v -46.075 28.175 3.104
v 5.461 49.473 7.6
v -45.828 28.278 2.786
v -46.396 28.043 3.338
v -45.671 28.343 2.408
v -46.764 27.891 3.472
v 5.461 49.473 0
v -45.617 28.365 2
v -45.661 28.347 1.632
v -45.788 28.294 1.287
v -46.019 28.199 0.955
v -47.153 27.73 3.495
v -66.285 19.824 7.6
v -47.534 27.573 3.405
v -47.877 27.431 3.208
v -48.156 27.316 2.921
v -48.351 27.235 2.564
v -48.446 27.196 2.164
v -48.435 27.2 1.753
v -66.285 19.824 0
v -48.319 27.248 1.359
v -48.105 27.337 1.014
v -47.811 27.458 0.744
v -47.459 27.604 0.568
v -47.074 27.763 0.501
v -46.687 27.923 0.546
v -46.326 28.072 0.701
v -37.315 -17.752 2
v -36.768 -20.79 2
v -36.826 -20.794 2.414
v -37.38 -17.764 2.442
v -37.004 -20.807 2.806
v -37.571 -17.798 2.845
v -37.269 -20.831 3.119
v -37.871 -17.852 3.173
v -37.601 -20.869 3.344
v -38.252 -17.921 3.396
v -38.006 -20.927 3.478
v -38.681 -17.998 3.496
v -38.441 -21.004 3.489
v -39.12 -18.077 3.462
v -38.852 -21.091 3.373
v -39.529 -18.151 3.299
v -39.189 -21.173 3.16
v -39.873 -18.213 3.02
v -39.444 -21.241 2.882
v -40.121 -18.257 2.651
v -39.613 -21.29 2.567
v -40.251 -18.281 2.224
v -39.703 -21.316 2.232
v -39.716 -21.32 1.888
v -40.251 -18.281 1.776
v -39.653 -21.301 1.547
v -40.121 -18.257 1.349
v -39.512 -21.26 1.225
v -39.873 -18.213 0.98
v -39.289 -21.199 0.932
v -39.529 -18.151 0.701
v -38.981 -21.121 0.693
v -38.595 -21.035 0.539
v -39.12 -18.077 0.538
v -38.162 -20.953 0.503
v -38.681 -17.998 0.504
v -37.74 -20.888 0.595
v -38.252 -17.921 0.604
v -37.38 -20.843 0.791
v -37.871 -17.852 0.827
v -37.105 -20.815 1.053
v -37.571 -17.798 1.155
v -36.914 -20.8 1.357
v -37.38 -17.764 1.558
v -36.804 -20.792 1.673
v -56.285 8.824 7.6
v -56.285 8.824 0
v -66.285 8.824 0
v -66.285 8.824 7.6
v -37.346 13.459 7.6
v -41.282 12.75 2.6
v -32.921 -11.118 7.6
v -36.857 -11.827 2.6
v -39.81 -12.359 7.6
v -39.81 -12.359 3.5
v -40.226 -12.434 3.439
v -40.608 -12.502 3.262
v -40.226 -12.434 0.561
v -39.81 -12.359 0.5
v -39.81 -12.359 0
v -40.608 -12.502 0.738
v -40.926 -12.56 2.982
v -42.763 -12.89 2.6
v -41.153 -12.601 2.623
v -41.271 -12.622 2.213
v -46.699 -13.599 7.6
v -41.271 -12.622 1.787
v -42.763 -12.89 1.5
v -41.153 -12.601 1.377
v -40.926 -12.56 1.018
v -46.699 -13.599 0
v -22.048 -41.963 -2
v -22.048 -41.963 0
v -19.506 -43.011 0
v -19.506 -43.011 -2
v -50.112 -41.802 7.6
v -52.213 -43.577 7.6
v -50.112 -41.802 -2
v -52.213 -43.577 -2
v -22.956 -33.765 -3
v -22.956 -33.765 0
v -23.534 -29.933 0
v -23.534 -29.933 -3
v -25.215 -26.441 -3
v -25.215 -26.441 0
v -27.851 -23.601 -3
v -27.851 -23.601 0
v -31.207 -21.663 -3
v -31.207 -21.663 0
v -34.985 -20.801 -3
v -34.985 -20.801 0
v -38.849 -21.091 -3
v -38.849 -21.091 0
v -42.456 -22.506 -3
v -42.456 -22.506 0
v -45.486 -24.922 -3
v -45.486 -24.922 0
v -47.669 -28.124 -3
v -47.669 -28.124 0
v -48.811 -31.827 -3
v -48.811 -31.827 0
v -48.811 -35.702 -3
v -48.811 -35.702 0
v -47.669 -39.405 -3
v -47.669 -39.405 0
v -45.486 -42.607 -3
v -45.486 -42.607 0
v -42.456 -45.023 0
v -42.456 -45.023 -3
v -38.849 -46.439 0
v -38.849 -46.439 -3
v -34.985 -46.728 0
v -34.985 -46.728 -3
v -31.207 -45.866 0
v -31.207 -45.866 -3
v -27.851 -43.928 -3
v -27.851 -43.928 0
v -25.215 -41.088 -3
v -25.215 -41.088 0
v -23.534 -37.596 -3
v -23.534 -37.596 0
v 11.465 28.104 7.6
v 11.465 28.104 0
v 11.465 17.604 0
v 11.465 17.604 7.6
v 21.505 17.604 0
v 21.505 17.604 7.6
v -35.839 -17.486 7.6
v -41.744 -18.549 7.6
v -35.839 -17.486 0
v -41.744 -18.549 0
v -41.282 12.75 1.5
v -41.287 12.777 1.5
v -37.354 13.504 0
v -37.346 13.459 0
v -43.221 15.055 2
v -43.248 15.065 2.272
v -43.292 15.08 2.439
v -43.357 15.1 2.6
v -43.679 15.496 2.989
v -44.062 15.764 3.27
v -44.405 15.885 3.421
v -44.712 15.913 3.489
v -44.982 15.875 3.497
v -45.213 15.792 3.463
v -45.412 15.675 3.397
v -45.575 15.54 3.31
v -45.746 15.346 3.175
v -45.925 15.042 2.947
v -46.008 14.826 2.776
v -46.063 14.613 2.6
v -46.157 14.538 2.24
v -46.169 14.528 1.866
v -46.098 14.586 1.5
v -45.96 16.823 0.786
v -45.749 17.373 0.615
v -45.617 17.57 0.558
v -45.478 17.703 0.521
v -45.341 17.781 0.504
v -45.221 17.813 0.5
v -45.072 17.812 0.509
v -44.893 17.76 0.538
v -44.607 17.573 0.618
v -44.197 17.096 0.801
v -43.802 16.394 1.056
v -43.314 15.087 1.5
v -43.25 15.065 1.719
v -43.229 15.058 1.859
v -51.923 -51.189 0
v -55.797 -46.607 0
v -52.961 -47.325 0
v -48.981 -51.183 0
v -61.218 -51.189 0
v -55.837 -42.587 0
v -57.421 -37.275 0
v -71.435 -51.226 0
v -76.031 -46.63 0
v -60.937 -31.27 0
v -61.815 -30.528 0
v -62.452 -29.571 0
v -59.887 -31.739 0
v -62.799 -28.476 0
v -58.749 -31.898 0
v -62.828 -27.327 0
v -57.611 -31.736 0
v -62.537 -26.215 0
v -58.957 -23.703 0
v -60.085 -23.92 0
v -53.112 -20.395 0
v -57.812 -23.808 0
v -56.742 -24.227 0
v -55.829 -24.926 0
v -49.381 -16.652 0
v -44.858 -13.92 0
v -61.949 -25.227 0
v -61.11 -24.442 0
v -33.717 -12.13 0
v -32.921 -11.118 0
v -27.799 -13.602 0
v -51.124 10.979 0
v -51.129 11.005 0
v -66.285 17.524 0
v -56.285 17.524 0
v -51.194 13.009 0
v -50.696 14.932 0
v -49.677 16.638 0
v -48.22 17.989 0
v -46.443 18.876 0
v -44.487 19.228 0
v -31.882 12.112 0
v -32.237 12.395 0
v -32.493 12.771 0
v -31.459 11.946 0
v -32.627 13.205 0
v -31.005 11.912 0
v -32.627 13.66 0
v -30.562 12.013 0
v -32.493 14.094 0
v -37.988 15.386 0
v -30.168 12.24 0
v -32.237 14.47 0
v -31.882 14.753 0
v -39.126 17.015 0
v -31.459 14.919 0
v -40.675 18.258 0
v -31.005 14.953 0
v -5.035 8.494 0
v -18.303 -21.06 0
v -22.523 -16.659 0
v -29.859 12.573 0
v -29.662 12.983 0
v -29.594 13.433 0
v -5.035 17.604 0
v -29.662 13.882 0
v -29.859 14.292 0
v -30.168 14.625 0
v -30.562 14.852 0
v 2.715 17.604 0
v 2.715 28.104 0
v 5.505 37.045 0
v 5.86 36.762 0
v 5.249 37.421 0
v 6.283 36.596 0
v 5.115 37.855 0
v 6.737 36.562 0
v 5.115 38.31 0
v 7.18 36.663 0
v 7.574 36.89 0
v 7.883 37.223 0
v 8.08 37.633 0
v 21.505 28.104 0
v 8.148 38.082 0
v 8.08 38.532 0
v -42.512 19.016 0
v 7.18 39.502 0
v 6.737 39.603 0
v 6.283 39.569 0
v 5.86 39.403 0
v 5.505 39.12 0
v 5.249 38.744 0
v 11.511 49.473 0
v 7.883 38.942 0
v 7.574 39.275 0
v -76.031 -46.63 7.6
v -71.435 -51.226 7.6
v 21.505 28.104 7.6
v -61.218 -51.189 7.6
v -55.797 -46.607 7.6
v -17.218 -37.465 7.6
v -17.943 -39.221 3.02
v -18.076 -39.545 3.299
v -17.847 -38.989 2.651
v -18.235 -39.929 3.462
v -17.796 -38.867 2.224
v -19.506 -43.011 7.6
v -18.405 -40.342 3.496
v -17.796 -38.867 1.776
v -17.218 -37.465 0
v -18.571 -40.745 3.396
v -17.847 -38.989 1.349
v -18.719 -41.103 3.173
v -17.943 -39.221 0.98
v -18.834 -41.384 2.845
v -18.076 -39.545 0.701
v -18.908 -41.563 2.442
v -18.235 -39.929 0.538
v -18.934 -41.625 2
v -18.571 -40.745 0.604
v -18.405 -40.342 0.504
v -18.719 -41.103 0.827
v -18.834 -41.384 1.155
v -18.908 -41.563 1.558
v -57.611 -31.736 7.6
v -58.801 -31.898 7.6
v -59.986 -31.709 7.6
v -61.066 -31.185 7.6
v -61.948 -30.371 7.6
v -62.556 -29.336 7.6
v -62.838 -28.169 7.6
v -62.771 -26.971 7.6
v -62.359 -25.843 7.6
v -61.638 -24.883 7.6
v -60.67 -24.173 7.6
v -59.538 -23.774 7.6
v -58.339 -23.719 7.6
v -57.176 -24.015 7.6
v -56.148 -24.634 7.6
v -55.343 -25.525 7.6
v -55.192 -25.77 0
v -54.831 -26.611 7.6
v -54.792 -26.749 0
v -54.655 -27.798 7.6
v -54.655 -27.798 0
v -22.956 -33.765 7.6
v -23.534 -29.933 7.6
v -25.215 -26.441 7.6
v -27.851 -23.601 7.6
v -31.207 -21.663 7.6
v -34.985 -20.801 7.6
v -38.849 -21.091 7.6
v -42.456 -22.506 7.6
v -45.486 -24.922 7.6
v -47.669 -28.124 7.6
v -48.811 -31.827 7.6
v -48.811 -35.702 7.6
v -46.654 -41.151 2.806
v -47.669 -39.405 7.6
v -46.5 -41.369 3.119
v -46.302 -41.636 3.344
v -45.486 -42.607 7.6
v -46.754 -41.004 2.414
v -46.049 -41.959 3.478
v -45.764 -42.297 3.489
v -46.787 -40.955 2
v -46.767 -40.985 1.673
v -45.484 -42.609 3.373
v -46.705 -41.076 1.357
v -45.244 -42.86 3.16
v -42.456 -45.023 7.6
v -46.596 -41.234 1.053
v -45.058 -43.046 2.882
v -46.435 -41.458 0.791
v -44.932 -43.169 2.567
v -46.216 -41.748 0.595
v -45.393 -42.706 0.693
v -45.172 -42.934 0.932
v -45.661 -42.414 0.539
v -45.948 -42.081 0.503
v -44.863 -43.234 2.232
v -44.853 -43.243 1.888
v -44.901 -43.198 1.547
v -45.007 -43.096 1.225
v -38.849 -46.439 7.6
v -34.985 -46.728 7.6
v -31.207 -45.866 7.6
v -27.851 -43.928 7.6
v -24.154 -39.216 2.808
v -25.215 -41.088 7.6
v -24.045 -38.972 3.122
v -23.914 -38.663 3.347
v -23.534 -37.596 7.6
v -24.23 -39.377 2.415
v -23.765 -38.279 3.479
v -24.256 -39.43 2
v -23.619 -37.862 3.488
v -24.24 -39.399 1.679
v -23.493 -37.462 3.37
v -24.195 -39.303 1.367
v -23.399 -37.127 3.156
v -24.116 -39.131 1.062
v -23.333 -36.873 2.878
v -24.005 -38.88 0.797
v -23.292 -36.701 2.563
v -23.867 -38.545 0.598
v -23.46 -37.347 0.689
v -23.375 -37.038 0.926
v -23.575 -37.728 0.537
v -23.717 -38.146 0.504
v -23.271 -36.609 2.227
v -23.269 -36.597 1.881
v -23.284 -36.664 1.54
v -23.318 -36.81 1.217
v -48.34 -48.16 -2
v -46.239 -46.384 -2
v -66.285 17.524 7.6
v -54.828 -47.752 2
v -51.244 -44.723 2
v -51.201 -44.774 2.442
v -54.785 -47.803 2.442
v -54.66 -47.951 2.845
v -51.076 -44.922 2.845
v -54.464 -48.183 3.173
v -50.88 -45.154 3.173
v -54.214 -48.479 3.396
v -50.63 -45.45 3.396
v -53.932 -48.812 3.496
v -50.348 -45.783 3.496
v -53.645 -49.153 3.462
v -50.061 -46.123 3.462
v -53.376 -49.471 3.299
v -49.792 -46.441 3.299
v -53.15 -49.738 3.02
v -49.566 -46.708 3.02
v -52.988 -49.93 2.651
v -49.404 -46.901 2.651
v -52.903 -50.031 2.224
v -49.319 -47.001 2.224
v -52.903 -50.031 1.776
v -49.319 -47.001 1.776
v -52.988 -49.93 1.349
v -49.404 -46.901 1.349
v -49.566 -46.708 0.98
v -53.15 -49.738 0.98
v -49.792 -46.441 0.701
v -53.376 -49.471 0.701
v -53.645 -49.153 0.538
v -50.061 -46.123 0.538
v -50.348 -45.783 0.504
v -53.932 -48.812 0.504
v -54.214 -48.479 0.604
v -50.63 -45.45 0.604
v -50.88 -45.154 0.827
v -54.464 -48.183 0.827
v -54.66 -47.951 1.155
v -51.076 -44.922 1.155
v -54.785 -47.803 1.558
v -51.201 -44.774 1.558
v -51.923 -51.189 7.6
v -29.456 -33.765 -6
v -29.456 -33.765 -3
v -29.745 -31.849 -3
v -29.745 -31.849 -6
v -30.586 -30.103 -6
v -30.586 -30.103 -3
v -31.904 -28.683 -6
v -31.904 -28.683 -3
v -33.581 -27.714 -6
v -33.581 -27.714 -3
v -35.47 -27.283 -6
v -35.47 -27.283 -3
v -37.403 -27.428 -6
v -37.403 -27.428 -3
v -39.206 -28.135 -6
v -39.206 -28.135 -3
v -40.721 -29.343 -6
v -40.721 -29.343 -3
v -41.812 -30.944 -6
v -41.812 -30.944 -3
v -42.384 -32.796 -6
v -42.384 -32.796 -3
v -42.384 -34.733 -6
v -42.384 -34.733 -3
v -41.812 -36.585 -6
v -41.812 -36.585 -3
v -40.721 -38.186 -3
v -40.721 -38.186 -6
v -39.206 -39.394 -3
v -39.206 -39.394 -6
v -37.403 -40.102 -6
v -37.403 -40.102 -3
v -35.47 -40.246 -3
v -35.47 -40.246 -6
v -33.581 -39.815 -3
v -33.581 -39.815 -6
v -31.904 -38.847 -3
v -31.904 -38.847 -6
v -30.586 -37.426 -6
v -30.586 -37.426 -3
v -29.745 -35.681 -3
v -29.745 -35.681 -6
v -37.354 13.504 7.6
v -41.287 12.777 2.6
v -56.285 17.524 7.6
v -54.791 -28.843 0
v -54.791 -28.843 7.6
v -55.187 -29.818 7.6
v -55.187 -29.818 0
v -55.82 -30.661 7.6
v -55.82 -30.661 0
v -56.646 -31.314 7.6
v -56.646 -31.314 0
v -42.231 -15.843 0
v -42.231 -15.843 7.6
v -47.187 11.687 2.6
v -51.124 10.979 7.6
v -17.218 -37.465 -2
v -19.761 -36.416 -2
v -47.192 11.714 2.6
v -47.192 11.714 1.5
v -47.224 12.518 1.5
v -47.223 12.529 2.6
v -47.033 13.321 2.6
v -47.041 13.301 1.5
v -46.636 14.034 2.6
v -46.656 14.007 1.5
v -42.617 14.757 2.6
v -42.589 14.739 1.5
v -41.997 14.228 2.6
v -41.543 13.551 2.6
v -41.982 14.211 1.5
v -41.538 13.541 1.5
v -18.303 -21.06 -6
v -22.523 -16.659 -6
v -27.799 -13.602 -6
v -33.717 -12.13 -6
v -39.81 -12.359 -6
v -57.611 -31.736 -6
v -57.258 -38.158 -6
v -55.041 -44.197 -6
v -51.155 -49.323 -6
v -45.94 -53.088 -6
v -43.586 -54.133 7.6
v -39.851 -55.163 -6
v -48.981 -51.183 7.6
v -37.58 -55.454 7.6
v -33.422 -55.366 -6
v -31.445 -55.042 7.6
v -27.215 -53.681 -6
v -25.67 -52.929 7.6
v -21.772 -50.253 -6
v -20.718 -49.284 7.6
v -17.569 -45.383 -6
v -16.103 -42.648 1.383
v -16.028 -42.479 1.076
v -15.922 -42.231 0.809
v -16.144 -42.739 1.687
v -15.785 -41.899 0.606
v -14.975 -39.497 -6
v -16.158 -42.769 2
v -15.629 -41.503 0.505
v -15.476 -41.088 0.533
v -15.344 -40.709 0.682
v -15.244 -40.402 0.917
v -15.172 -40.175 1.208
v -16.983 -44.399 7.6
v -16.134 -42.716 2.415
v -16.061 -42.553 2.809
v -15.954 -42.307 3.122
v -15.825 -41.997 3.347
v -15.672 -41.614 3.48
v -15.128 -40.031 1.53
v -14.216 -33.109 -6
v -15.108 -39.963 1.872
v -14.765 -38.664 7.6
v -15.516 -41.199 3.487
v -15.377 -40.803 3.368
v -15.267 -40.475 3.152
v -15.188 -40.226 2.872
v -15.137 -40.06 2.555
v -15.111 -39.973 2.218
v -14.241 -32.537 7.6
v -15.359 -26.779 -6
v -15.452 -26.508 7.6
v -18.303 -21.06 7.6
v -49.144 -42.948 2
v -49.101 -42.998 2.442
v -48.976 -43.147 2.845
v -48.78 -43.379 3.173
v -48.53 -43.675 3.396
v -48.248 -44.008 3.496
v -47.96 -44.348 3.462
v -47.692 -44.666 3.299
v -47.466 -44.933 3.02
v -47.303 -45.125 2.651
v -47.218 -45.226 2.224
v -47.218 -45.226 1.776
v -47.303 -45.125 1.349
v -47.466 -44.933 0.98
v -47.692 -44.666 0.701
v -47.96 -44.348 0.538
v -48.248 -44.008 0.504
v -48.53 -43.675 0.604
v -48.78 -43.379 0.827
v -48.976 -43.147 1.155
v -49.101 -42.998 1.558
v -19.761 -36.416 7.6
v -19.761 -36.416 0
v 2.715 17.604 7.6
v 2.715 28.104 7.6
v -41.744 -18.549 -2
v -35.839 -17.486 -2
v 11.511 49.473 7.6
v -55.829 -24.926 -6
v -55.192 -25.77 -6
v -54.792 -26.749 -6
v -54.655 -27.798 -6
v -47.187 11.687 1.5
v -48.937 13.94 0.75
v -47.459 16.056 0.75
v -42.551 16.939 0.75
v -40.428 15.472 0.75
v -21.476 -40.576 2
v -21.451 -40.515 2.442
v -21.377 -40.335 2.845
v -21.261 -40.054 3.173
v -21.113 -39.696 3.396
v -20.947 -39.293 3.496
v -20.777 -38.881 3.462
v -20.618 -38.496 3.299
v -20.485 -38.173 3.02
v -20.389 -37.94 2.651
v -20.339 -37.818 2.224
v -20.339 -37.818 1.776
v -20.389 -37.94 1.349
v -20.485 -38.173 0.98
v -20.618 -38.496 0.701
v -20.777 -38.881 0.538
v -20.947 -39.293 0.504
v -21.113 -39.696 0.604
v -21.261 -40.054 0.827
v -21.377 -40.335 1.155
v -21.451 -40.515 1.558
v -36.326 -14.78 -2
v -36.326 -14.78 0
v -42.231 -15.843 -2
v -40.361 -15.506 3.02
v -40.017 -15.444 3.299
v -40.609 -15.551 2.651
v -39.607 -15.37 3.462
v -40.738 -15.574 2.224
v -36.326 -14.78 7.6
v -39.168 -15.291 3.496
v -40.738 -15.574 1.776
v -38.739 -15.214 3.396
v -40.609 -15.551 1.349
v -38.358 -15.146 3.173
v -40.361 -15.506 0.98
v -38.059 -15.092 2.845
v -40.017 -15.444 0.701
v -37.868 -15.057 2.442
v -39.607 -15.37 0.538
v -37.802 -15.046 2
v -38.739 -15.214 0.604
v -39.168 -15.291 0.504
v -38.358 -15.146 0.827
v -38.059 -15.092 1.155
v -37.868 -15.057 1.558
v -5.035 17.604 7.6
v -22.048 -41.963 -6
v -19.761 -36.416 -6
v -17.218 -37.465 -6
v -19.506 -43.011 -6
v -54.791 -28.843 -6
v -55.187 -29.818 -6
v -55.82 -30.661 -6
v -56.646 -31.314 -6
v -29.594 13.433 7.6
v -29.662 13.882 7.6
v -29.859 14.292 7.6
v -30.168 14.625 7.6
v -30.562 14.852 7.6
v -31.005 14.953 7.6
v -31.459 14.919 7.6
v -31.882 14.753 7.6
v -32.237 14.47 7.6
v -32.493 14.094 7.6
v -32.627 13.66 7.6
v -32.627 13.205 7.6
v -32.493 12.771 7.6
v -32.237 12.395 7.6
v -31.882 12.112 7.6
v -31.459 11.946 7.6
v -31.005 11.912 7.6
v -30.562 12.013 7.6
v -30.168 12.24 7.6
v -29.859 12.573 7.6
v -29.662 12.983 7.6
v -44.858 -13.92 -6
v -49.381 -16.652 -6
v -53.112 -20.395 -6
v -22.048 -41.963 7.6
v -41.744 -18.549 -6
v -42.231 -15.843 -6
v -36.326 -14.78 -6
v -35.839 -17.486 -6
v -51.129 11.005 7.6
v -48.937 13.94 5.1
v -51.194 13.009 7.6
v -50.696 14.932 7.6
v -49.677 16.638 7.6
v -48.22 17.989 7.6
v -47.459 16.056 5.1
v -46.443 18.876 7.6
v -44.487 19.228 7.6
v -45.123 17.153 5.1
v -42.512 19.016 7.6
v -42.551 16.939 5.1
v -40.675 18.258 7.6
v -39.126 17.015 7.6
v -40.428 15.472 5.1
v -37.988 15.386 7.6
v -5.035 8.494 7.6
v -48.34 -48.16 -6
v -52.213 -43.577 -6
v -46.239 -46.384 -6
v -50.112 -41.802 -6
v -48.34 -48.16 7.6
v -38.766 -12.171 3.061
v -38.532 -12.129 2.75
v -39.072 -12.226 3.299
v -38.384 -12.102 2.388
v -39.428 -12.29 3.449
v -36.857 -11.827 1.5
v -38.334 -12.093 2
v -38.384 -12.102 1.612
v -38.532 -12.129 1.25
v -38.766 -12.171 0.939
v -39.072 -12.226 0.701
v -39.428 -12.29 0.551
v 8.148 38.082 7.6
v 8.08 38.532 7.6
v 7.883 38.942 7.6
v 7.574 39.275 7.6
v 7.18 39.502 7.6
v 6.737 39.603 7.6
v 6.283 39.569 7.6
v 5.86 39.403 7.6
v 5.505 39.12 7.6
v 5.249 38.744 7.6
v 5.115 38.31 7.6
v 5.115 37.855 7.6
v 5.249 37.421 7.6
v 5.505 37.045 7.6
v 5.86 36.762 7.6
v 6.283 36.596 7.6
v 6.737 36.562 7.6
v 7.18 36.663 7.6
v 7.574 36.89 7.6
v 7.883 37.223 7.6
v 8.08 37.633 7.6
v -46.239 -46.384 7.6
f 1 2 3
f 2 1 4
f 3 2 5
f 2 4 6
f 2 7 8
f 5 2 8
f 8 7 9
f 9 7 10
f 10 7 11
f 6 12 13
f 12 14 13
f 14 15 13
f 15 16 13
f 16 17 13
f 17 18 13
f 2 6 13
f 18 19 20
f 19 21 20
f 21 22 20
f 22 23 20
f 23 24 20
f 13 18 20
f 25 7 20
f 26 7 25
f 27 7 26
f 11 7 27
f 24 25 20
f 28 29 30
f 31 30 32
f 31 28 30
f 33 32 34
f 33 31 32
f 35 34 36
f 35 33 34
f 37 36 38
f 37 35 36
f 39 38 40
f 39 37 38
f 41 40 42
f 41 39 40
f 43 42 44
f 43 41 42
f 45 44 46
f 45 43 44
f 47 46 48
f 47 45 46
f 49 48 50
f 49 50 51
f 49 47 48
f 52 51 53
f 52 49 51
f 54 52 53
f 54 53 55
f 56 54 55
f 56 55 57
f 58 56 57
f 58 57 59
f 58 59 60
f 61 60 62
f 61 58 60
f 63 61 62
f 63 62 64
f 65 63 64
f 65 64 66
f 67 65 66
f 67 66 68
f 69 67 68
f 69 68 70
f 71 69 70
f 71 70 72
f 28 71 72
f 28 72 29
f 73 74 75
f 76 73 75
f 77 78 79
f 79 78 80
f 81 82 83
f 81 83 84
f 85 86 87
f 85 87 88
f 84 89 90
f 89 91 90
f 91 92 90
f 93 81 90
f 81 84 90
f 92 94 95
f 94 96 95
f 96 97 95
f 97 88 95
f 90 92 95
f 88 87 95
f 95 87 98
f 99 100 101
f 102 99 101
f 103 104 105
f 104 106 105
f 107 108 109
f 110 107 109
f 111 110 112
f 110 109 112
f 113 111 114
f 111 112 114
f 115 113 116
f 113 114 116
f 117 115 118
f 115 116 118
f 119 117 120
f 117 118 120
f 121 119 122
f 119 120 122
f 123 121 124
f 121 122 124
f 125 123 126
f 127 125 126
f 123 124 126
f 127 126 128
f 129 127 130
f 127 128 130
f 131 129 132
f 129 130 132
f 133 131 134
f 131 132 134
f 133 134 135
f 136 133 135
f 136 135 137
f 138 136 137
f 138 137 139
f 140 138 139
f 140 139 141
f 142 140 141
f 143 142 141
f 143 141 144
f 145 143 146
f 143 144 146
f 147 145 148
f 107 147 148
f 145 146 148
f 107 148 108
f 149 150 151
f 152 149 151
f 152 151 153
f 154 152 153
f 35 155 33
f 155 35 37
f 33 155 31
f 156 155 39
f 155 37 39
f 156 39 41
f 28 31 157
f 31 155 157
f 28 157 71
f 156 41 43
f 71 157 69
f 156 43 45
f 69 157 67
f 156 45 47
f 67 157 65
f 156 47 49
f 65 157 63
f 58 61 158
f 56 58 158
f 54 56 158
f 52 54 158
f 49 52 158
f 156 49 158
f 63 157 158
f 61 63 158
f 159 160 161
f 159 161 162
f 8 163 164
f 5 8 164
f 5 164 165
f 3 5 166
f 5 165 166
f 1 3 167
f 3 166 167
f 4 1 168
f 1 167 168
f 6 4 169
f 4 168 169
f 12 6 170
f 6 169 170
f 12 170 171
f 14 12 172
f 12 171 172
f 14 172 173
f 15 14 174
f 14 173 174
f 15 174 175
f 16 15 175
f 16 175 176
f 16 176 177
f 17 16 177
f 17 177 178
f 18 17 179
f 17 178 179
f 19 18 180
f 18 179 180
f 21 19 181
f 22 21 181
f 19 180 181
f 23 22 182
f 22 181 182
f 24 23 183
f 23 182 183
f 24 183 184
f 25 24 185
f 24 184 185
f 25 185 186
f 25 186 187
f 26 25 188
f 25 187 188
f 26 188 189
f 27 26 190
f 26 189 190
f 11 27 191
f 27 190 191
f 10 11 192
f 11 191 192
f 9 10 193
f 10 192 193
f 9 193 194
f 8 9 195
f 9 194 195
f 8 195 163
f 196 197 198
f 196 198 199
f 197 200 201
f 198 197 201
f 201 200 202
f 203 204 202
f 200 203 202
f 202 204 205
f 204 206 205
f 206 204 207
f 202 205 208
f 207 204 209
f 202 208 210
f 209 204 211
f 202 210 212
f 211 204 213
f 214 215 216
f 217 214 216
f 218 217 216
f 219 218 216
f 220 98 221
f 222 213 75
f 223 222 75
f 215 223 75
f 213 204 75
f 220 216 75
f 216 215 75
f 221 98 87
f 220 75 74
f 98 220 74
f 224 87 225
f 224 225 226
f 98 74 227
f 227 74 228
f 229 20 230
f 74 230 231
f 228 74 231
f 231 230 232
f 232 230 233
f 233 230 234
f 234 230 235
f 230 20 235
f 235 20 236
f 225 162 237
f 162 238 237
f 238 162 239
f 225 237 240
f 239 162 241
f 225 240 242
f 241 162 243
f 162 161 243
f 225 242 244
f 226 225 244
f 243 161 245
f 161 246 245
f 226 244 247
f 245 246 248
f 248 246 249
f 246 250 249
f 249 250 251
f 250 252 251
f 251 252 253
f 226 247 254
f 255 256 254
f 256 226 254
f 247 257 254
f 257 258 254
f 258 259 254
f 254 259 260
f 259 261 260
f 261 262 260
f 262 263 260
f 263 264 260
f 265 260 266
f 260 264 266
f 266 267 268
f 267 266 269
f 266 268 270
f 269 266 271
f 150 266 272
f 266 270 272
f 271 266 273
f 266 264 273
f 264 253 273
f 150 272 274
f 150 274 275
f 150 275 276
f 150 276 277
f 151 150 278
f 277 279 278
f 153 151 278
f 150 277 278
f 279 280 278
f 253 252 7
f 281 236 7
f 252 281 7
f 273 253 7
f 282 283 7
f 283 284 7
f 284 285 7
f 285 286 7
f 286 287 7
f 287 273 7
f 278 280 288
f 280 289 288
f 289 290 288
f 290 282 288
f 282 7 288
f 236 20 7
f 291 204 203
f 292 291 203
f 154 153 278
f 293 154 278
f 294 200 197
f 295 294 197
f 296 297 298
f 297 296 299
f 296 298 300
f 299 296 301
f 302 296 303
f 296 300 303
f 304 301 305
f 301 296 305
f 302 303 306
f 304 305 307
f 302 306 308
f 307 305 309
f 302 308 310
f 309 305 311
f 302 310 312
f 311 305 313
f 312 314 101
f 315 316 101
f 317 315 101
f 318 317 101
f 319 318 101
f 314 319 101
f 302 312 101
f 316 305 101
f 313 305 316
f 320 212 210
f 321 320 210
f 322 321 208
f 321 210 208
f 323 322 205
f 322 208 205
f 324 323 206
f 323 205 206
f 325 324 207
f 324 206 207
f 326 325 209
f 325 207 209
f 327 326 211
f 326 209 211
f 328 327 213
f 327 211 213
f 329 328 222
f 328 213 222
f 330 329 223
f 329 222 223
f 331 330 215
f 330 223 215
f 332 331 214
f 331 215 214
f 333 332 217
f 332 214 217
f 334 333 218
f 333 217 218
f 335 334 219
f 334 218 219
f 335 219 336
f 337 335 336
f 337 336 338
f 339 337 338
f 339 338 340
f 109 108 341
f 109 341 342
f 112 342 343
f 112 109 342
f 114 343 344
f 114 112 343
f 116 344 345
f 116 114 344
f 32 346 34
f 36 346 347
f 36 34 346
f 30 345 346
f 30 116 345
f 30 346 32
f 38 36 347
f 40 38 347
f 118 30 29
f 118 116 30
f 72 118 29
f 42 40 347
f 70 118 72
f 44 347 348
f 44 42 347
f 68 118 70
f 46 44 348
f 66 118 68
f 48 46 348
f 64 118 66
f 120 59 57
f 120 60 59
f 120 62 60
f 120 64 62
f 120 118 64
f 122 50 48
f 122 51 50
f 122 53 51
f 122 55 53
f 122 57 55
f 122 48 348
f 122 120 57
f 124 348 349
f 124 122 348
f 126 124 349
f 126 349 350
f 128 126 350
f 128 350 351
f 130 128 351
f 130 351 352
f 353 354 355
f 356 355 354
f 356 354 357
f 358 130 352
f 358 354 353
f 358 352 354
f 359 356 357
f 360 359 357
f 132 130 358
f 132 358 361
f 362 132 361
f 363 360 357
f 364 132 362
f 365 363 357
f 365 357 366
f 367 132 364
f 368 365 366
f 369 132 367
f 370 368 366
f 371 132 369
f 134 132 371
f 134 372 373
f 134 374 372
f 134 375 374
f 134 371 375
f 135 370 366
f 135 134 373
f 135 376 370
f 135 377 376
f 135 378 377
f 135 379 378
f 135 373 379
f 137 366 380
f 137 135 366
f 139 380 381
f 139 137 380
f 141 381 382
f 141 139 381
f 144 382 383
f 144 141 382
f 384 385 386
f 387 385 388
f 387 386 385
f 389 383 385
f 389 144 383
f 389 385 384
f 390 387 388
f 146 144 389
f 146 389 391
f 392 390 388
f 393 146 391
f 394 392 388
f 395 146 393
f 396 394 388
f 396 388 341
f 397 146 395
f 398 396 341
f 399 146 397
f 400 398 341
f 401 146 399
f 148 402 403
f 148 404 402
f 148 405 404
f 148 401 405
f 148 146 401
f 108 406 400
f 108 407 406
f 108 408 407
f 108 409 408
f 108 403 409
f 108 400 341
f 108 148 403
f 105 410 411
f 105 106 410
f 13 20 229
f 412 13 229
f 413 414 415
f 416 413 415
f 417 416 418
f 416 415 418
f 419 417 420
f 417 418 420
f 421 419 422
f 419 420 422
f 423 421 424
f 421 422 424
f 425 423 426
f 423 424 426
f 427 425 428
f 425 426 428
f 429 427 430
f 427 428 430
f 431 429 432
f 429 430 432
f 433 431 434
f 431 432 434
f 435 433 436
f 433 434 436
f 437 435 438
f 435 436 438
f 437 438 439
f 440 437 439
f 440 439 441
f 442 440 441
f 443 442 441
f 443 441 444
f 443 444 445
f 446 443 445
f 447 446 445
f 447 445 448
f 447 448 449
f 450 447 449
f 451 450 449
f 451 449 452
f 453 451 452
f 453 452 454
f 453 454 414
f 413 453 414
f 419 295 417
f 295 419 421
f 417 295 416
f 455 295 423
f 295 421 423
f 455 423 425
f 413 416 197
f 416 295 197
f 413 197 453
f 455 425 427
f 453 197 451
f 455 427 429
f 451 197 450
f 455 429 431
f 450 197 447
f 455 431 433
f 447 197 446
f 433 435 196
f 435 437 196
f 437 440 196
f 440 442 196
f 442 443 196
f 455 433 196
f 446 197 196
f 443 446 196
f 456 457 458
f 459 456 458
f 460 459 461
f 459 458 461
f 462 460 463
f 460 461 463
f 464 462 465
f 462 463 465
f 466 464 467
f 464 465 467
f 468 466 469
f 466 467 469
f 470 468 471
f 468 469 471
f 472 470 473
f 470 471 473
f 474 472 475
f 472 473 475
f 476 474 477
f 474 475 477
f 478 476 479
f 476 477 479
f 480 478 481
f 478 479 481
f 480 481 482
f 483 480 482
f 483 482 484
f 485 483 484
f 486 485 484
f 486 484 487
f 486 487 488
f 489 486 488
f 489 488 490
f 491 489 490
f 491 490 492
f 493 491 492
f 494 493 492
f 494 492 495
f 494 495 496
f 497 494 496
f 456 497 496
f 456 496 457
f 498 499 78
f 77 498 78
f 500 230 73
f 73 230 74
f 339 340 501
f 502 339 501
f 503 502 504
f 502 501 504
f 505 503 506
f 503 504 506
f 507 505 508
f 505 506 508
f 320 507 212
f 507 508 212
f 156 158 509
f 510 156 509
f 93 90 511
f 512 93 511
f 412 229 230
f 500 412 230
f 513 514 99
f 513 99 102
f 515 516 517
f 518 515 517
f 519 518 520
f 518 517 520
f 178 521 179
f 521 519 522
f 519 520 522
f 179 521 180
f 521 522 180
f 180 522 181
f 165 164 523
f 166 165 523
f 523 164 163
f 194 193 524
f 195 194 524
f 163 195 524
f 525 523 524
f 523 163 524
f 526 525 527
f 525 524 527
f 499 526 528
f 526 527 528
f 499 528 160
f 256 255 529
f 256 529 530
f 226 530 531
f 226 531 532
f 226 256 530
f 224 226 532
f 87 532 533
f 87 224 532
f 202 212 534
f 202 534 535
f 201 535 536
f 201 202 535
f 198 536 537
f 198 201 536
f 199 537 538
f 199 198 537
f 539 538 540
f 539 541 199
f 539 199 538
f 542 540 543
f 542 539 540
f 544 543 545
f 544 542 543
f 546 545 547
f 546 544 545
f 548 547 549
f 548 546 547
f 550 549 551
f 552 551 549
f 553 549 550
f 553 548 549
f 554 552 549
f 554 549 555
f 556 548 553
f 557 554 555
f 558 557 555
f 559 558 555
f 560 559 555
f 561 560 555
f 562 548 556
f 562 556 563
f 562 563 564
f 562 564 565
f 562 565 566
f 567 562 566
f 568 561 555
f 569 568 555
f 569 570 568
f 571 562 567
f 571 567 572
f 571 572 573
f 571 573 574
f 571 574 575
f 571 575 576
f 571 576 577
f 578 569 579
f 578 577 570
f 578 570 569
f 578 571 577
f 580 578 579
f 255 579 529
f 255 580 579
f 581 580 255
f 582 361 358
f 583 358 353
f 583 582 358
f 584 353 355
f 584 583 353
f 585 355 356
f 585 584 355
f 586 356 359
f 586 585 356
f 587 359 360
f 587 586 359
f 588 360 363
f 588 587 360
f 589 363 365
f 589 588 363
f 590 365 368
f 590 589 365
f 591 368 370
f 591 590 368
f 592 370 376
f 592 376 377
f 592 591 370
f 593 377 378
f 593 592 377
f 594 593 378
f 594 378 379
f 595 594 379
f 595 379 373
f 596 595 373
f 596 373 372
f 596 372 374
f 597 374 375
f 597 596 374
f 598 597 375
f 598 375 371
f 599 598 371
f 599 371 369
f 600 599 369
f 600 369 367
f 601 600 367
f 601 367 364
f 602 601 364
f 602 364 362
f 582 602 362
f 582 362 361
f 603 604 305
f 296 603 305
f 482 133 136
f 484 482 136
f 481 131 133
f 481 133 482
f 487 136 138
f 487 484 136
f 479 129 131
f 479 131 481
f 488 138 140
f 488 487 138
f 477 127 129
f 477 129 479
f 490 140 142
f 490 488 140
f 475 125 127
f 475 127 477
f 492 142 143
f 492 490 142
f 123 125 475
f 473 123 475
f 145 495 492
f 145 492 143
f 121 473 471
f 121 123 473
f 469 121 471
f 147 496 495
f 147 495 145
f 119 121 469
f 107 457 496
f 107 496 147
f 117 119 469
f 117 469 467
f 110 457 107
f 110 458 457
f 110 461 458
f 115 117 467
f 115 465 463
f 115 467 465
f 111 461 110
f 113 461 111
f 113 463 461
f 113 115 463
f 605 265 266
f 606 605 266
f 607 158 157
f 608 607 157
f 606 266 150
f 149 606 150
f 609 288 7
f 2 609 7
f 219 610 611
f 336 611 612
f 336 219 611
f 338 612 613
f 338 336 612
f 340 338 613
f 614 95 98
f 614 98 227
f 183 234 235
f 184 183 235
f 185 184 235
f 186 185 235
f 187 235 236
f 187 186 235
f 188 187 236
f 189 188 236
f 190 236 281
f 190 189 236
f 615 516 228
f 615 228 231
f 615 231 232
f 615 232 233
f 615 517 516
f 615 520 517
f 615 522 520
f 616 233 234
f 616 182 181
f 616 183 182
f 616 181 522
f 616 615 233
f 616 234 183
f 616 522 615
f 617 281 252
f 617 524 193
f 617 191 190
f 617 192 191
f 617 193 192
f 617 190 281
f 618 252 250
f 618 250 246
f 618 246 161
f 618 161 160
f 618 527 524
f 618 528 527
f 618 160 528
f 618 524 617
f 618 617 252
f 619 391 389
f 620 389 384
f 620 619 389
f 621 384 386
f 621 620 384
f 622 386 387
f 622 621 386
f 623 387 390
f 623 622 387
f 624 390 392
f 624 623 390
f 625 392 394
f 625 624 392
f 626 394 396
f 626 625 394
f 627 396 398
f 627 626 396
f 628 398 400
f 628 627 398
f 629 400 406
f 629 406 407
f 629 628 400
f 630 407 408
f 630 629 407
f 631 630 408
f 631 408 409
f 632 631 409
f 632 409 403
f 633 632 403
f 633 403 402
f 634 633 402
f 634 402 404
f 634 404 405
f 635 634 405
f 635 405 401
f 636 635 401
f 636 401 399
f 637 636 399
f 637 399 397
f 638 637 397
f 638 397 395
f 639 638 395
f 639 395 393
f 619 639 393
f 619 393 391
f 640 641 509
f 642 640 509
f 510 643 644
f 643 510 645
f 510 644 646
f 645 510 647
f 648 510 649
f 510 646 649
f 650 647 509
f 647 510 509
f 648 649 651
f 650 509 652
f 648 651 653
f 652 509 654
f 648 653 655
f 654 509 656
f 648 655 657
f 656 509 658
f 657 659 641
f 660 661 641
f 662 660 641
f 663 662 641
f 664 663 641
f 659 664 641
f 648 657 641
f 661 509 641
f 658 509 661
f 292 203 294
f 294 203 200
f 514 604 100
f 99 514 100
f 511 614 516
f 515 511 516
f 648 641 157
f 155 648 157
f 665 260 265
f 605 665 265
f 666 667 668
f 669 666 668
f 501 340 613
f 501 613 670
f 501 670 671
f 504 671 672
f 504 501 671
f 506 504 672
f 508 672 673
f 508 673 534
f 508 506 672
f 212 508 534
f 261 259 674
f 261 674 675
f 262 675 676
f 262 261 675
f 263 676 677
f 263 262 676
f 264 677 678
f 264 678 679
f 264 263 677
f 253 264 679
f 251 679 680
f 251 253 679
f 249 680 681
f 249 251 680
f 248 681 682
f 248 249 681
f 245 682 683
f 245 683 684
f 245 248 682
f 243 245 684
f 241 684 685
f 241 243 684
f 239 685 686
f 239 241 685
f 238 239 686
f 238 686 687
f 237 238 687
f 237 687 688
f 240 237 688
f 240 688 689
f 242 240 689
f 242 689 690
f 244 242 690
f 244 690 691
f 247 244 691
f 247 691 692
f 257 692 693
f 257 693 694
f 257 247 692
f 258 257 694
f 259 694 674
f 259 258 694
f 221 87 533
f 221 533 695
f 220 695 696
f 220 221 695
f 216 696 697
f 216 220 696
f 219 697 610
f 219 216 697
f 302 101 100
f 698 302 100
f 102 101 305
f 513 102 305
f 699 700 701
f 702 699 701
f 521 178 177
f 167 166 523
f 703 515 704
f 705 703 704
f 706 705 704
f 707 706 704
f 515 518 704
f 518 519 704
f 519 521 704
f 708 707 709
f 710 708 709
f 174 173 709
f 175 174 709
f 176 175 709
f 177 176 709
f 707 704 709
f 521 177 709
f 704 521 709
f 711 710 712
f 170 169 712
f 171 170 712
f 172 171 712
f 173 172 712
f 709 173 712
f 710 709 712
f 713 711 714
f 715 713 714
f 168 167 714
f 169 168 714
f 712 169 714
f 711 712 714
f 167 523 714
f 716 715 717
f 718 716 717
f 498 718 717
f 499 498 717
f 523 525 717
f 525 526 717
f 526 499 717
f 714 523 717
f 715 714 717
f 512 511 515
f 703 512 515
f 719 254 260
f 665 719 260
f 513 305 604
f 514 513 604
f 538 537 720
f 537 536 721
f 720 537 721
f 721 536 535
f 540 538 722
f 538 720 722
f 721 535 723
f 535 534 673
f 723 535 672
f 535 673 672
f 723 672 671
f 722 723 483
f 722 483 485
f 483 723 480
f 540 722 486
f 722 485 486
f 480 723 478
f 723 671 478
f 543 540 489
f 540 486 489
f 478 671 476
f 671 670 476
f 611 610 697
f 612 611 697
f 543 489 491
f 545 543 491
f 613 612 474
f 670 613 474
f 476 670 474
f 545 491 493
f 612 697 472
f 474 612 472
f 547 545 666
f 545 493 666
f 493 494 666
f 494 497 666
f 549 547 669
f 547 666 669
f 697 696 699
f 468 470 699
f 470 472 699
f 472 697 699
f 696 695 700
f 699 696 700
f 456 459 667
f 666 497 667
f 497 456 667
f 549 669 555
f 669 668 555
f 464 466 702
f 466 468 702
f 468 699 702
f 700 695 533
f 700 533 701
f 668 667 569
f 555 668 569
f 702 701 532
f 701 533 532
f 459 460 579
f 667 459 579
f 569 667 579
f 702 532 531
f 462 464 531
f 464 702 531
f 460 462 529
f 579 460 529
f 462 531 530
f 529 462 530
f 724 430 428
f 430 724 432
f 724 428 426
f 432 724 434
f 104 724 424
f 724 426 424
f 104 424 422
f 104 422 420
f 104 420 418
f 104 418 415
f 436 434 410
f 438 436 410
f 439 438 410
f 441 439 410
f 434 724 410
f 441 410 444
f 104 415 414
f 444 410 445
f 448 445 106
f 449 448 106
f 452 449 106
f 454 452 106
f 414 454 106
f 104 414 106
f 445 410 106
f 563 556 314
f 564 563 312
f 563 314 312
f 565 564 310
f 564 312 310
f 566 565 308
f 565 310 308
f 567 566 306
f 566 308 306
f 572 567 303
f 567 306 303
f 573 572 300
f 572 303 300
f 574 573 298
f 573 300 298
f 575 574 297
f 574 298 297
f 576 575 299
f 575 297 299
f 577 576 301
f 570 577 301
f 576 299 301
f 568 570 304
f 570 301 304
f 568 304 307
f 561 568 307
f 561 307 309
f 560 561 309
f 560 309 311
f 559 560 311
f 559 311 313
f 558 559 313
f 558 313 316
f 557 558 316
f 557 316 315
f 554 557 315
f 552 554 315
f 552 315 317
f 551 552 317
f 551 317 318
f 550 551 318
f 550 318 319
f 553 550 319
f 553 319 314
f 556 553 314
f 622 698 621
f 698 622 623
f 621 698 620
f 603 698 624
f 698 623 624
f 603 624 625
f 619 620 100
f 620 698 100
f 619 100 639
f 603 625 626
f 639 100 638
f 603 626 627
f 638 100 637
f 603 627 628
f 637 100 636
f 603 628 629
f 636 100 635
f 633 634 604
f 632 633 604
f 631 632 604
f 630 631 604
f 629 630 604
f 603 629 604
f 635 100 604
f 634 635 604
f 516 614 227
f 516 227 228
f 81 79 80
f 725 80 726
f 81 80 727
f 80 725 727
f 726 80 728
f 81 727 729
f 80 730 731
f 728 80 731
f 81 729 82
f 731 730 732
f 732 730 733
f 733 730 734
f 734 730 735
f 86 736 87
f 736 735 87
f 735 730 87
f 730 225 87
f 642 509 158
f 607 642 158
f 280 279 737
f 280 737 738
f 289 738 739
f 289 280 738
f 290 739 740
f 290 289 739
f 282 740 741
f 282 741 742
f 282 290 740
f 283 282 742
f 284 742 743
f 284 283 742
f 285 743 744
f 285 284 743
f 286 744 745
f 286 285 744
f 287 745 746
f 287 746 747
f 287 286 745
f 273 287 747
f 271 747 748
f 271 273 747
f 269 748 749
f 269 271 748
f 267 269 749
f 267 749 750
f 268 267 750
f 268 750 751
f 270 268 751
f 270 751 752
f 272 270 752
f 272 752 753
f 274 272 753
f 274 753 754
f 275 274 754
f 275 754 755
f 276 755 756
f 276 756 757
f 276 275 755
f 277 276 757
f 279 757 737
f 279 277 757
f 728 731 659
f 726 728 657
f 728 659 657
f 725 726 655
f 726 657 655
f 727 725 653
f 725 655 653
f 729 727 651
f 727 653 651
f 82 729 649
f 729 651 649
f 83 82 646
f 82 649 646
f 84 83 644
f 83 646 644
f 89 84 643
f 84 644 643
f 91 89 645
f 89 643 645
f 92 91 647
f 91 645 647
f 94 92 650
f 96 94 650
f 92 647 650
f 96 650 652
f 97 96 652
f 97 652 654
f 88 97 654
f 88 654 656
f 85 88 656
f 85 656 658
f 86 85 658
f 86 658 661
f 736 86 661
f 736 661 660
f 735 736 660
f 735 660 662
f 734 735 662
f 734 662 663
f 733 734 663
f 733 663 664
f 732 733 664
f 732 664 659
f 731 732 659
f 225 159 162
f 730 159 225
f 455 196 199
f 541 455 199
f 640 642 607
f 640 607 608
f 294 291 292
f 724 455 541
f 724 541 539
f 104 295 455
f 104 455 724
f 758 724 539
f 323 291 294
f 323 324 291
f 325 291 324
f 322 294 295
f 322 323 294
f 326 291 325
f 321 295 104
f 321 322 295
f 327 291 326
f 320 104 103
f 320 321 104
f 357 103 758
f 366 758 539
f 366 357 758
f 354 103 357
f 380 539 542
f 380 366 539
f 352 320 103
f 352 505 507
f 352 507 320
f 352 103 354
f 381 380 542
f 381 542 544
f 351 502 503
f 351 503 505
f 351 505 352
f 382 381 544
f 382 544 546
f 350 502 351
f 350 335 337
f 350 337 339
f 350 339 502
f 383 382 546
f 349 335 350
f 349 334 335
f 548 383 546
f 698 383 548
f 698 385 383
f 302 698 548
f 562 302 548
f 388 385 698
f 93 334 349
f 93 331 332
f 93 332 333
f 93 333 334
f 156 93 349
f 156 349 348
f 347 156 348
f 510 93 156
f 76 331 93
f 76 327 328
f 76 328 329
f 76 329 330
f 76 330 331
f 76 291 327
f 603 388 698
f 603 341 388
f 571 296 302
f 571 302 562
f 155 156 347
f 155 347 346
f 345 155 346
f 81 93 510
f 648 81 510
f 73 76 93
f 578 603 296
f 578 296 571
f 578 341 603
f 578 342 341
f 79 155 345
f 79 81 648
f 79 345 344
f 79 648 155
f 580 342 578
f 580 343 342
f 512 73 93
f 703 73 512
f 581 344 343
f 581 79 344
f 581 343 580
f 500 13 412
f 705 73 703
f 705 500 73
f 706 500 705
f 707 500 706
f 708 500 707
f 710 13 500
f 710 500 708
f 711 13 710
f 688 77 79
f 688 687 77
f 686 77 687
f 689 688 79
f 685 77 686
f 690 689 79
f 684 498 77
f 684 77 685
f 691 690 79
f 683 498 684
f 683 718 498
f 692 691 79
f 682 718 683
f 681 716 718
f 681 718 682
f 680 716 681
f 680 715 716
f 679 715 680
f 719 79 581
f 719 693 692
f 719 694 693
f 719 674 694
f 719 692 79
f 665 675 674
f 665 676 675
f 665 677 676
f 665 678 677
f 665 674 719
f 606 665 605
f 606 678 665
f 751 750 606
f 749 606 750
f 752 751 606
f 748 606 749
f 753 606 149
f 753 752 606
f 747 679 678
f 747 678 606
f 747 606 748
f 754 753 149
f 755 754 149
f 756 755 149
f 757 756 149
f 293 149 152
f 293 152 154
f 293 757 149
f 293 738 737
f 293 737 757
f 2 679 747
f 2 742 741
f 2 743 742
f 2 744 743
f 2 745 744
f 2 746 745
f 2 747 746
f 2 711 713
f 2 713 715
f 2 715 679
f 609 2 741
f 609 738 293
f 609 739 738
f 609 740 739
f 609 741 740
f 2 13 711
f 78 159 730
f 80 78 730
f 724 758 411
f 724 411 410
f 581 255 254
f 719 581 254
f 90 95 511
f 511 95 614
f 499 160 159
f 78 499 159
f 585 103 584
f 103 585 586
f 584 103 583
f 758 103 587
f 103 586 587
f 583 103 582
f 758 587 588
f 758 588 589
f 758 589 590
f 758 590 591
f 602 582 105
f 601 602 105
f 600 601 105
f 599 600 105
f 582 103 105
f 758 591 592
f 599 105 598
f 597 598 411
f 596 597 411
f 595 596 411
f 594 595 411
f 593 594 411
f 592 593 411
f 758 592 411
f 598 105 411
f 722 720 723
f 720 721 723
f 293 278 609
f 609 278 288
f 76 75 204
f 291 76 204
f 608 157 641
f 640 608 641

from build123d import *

# Parameters (mm, degrees)
F0_R      = 1.525
F0_R_2    = 13
F1_DEPTH  = 7.6
F0_R_3    = 6.5
F2_DEPTH  = 6
F3_DEPTH  = 3
F4_DEPTH  = 6
F5_DEPTH  = 2
F6_SIZE2  = 5
F6_SIZE   = 4
F7_SIZE2  = 1.5
F7_SIZE   = 4
F8_R      = 1.5
F11_DEPTH = 45
F12_DEPTH = 10
F9_R      = 1.5
F13_DEPTH = 10
F14_DEPTH = 10
F10_R     = 1.5
F15_DEPTH = 15
F16_DEPTH = 10


with BuildPart() as f1:
    # F0 (on Top) → F1 (new body)
    with BuildSketch(Plane.XY):
        with BuildLine():
            Line((11.4654492345, 28.1041493633), (11.4654492345, 17.6041493633))
            Line((11.4654492345, 17.6041493633), (21.5054492345, 17.6041493633))
            Line((21.5054492345, 17.6041493633), (21.5054492345, 28.1041493633))
            Line((21.5054492345, 28.1041493633), (11.5113214177, 49.4730095995))
            Line((11.5113214177, 49.4730095995), (5.4613214177, 49.4730095995))
            Line((5.4613214177, 49.4730095995), (-66.2845185672, 19.8239773236))
            Line((-66.2845185672, 19.8239773236), (-66.2845185672, 17.5239773236))
            Line((-66.2845185672, 17.5239773236), (-56.2845185672, 17.5239773236))
            Line((-56.2845185672, 17.5239773236), (-56.2845185672, 8.8239773236))
            Line((-56.2845185672, 8.8239773236), (-66.2845185672, 8.8239773236))
            Line((-66.2845185672, 8.8239773236), (-76.0307126449, -46.6298285987))
            Line((-76.0307126449, -46.6298285987), (-71.4345185672, -51.2260226764))
            Line((-71.4345185672, -51.2260226764), (-61.2180819327, -51.1889110274))
            Line((-61.2180819327, -51.1889110274), (-55.7966974161, -46.606532264))
            Line((-55.7966974161, -46.606532264), (-51.9234810694, -51.1889110274))
            Line((-51.9234810694, -51.1889110274), (-48.9812307256, -51.1833146176))
            ThreePointArc((-48.9812307256, -51.1833146176), (-55.8366672394, -42.5867224617), (-57.6113446632, -31.7355047176))
            ThreePointArc((-57.6113446632, -31.7355047176), (-62.7216685586, -26.760327644), (-55.8293902254, -24.9261257448))
            ThreePointArc((-55.8293902254, -24.9261257448), (-49.3810695109, -16.6521794806), (-39.8099914805, -12.3587551881))
            ThreePointArc((-39.8099914805, -12.3587551881), (-27.7993054872, -13.6020861151), (-18.3026540226, -21.0597037496))
            Line((-18.3026540226, -21.0597037496), (-5.0345507655, 8.4941493633))
            Line((-5.0345507655, 8.4941493633), (-5.0345507655, 17.6041493633))
            Line((-5.0345507655, 17.6041493633), (2.7154492345, 17.6041493633))
            Line((2.7154492345, 17.6041493633), (2.7154492345, 28.1041493633))
            Line((2.7154492345, 28.1041493633), (11.4654492345, 28.1041493633))
        make_face()
        with BuildLine():
            Line((-36.8574590489, -11.8271979792), (-39.8099914805, -12.3587551881))
            Line((-39.8099914805, -12.3587551881), (-42.7625236411, -12.8903123481))
            Line((-42.7625236411, -12.8903123481), (-47.1873519708, 11.6873792538))
            Line((-47.1873519708, 11.6873792538), (-47.1921668449, 11.7141234529))
            ThreePointArc((-47.1921668449, 11.7141234529), (-44.7687897478, 15.1848711151), (-41.2871022526, 12.7772378218))
            Line((-41.2871022526, 12.7772378218), (-41.2822873786, 12.7504936227))
            Line((-41.2822873786, 12.7504936227), (-36.8574590489, -11.8271979792))
        make_face(mode=Mode.SUBTRACT)
        with Locations((-31.119161509, 13.4325037545)):
            Circle(F0_R, mode=Mode.SUBTRACT)
        with Locations((6.6226837225, 38.0824916065)):
            Circle(F0_R, mode=Mode.SUBTRACT)
        with BuildLine():
            ThreePointArc((-48.9812307256, -51.1833146176), (-20.7176395084, -49.2839158598), (-18.3026540226, -21.0597037496))
            ThreePointArc((-18.3026540226, -21.0597037496), (-27.7993054872, -13.6020861151), (-39.8099914805, -12.3587551881))
            ThreePointArc((-39.8099914805, -12.3587551881), (-49.3810695109, -16.6521794806), (-55.8293902254, -24.9261257448))
            ThreePointArc((-55.8293902254, -24.9261257448), (-54.9601088644, -26.2468514875), (-54.6552348922, -27.7983083618))
            ThreePointArc((-54.6552348922, -27.7983083618), (-55.4765194472, -30.2600201708), (-57.6113446632, -31.7355047176))
            ThreePointArc((-57.6113446632, -31.7355047176), (-55.8366672394, -42.5867224617), (-48.9812307256, -51.1833146176))
        make_face()
        Polygon((-50.1124866335, -41.8020018535), (-46.2392702868, -46.3843806169), (-48.33952722, -48.1596047758), (-52.2127435668, -43.5772260124), align=None, mode=Mode.SUBTRACT)
        with Locations((-35.9562017577, -33.7646143106)):
            Circle(F0_R_2, mode=Mode.SUBTRACT)
        Polygon((-41.7437057042, -18.5493325824), (-42.2309664567, -15.8428446443), (-36.3259018644, -14.7797302754), (-35.838641112, -17.4862182135), align=None, mode=Mode.SUBTRACT)
        Polygon((-22.0480286327, -41.9629163019), (-19.7605397552, -36.416079849), (-17.2182397143, -37.4645122512), (-19.5057285918, -43.0113487041), align=None, mode=Mode.SUBTRACT)
    extrude(amount=F1_DEPTH)

    # F0 (on Top) → F2 (join)
    with BuildSketch(Plane.XY):
        with BuildLine():
            ThreePointArc((-48.9812307256, -51.1833146176), (-20.7176395084, -49.2839158598), (-18.3026540226, -21.0597037496))
            ThreePointArc((-18.3026540226, -21.0597037496), (-27.7993054872, -13.6020861151), (-39.8099914805, -12.3587551881))
            ThreePointArc((-39.8099914805, -12.3587551881), (-49.3810695109, -16.6521794806), (-55.8293902254, -24.9261257448))
            ThreePointArc((-55.8293902254, -24.9261257448), (-54.9601088644, -26.2468514875), (-54.6552348922, -27.7983083618))
            ThreePointArc((-54.6552348922, -27.7983083618), (-55.4765194472, -30.2600201708), (-57.6113446632, -31.7355047176))
            ThreePointArc((-57.6113446632, -31.7355047176), (-55.8366672394, -42.5867224617), (-48.9812307256, -51.1833146176))
        make_face()
        Polygon((-50.1124866335, -41.8020018535), (-46.2392702868, -46.3843806169), (-48.33952722, -48.1596047758), (-52.2127435668, -43.5772260124), align=None, mode=Mode.SUBTRACT)
        with Locations((-35.9562017577, -33.7646143106)):
            Circle(F0_R_2, mode=Mode.SUBTRACT)
        Polygon((-41.7437057042, -18.5493325824), (-42.2309664567, -15.8428446443), (-36.3259018644, -14.7797302754), (-35.838641112, -17.4862182135), align=None, mode=Mode.SUBTRACT)
        Polygon((-22.0480286327, -41.9629163019), (-19.7605397552, -36.416079849), (-17.2182397143, -37.4645122512), (-19.5057285918, -43.0113487041), align=None, mode=Mode.SUBTRACT)
        with Locations((-35.9562017577, -33.7646143106)):
            Circle(F0_R_2)
        with Locations((-35.9562017577, -33.7646143106)):
            Circle(F0_R_3, mode=Mode.SUBTRACT)
    extrude(amount=-F2_DEPTH)

    # F0 (on Top) → F3 (cut)
    with BuildSketch(Plane.XY):
        with Locations((-35.9562017577, -33.7646143106)):
            Circle(F0_R_2)
        with Locations((-35.9562017577, -33.7646143106)):
            Circle(F0_R_3, mode=Mode.SUBTRACT)
    extrude(amount=-F3_DEPTH, mode=Mode.SUBTRACT)

    # F0 (on Top) → F4 (join)
    with BuildSketch(Plane.XY):
        Polygon((-48.33952722, -48.1596047758), (-46.2392702868, -46.3843806169), (-50.1124866335, -41.8020018535), (-52.2127435668, -43.5772260124), align=None)
        Polygon((-36.3259018644, -14.7797302754), (-42.2309664567, -15.8428446443), (-41.7437057042, -18.5493325824), (-35.838641112, -17.4862182135), align=None)
        Polygon((-17.2182397143, -37.4645122512), (-19.7605397552, -36.416079849), (-22.0480286327, -41.9629163019), (-19.5057285918, -43.0113487041), align=None)
    extrude(amount=-F4_DEPTH)

    # F0 (on Top) → F5 (cut)
    with BuildSketch(Plane.XY):
        Polygon((-36.3259018644, -14.7797302754), (-42.2309664567, -15.8428446443), (-41.7437057042, -18.5493325824), (-35.838641112, -17.4862182135), align=None)
        Polygon((-17.2182397143, -37.4645122512), (-19.7605397552, -36.416079849), (-22.0480286327, -41.9629163019), (-19.5057285918, -43.0113487041), align=None)
        Polygon((-48.33952722, -48.1596047758), (-46.2392702868, -46.3843806169), (-50.1124866335, -41.8020018535), (-52.2127435668, -43.5772260124), align=None)
    extrude(amount=-F5_DEPTH, mode=Mode.SUBTRACT)

    # F6
    f6_edges = [f1.edges().sort_by_distance(p)[0] for p in [
        (-44.76879, 15.184871, 7.6),
        (-39.072281, 0.47502, 7.6),
        (-44.977345, -0.588094, 7.6),
    ]]
    f6_side = f1.faces().sort_by_distance((-32.346153, -0.818971, 7.6))[0]
    chamfer(f6_edges, length=F6_SIZE, length2=F6_SIZE2, reference=f6_side)

    # F7
    f7_edges = [f1.edges().sort_by_distance(p)[0] for p in [
        (-39.072281, 0.47502, 0),
        (-44.977345, -0.588094, 0),
        (-44.76879, 15.184871, 0),
    ]]
    f7_side = f1.faces().sort_by_distance((-31.55219, 6.99064, 0))[0]
    chamfer(f7_edges, length=F7_SIZE, length2=F7_SIZE2, reference=f7_side)

    # F8 (on face) → F11 (cut)
    with BuildSketch(Plane(origin=(1.4368780264, -7.9811333617, 0), x_dir=(0.984177432, 0.1771857282, 0), z_dir=(0.1771857282, -0.984177432, 0))):
        with Locations((-41.3698900842, 2)):
            Circle(F8_R)
    extrude(amount=-F11_DEPTH, mode=Mode.SUBTRACT)

    # F8 (on face) → F12 (cut)
    with BuildSketch(Plane(origin=(1.4368780264, -7.9811333617, 0), x_dir=(0.984177432, 0.1771857282, 0), z_dir=(0.1771857282, -0.984177432, 0))):
        with Locations((-41.3698900842, 2)):
            Circle(F8_R)
    extrude(amount=F12_DEPTH, mode=Mode.SUBTRACT)

    # F9 (on face) → F13 (cut)
    with BuildSketch(Plane(origin=(-1.5110668178, 0.6231567432, 0), x_dir=(-0.3812481463, -0.9244727422, 0), z_dir=(-0.9244727422, 0.3812481463, 0))):
        with Locations((44.199342347, 2)):
            Circle(F9_R)
    extrude(amount=-F13_DEPTH, mode=Mode.SUBTRACT)

    # F9 (on face) → F14 (cut)
    with BuildSketch(Plane(origin=(-1.5110668178, 0.6231567432, 0), x_dir=(-0.3812481463, -0.9244727422, 0), z_dir=(-0.9244727422, 0.3812481463, 0))):
        with Locations((44.199342347, 2)):
            Circle(F9_R)
    extrude(amount=F14_DEPTH, mode=Mode.SUBTRACT)

    # F10 (on face) → F15 (cut)
    with BuildSketch(Plane(origin=(-51.939047377, -43.9010343142, 0), x_dir=(-0.6455360578, 0.7637297939, 0), z_dir=(0.7637297939, 0.6455360578, 0))):
        with Locations((-2.576017193, 2)):
            Circle(F10_R)
    extrude(amount=-F15_DEPTH, mode=Mode.SUBTRACT)

    # F10 (on face) → F16 (cut)
    with BuildSketch(Plane(origin=(-51.939047377, -43.9010343142, 0), x_dir=(-0.6455360578, 0.7637297939, 0), z_dir=(0.7637297939, 0.6455360578, 0))):
        with Locations((-2.576017193, 2)):
            Circle(F10_R)
    extrude(amount=F16_DEPTH, mode=Mode.SUBTRACT)


solid = f1.part
